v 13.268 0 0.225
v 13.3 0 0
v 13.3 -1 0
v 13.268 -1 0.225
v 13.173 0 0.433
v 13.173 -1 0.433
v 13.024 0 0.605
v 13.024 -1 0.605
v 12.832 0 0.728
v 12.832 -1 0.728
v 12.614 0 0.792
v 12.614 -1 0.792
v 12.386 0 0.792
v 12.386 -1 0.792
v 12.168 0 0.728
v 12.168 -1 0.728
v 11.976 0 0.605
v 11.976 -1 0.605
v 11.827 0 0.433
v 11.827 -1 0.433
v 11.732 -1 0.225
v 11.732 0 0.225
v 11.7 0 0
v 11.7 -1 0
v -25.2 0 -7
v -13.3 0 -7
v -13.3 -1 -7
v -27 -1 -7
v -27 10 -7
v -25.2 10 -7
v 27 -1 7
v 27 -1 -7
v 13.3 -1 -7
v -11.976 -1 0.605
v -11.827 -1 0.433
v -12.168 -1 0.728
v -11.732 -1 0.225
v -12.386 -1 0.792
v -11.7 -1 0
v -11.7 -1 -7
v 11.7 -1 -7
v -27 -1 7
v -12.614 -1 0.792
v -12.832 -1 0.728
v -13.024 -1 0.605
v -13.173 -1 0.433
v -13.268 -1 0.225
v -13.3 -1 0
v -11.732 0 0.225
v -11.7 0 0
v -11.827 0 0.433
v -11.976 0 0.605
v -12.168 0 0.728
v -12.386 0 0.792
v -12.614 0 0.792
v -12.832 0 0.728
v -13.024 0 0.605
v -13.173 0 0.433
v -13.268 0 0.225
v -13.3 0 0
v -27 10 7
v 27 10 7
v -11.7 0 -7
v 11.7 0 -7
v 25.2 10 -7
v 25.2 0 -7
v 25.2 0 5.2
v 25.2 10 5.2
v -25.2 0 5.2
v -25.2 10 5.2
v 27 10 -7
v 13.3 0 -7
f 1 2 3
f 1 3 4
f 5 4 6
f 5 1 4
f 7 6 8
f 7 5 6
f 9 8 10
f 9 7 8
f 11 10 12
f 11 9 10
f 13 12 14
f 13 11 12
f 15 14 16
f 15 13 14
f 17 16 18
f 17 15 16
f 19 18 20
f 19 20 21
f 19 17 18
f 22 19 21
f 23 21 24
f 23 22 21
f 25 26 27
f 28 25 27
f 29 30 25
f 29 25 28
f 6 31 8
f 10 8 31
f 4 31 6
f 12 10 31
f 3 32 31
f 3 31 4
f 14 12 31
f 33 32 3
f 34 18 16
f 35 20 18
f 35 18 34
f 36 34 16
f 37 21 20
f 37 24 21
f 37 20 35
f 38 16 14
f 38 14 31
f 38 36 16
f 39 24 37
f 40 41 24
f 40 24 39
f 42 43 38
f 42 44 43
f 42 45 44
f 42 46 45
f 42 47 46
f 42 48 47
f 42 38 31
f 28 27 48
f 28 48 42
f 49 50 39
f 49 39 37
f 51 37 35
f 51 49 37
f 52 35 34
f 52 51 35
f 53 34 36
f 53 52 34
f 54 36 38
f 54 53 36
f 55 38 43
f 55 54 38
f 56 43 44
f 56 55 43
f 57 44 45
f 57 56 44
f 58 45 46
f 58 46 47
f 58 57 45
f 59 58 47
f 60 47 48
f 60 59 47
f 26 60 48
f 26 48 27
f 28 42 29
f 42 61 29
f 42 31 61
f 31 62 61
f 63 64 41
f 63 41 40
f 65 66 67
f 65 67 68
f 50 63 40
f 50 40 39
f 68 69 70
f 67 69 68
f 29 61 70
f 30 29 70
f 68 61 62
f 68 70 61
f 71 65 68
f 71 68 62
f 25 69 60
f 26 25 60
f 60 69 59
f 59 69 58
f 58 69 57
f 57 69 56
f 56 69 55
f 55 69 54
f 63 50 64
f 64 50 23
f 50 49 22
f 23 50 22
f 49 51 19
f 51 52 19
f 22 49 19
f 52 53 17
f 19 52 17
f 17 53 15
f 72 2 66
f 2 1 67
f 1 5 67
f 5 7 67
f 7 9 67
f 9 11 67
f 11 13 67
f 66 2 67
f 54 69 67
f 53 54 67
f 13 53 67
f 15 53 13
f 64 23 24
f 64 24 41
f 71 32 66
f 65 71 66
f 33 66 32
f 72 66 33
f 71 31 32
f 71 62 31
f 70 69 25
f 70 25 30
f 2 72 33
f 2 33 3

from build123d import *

# Parameters (mm, degrees)
ESQUISSE1_W             = 54
ESQUISSE1_H             = 14
ESQUISSE1_W_2           = 50.4
ESQUISSE1_H_2           = 10.4
BOSS_EXTRU_1_DEPTH      = 10
ESQUISSE2_W             = 54
ESQUISSE2_H             = 14
BOSS_EXTRU_2_DEPTH      = 1
ENL_V_MAT_EXTRU_1_DEPTH = 1
ESQUISSE4_W             = 50.4
ESQUISSE4_H             = 10
ENL_V_MAT_EXTRU_2_DEPTH = 1.8


with BuildPart() as part:
    # Esquisse1 → Boss.-Extru.1 (new body)
    with BuildSketch(Plane(origin=(0, 0, 0), x_dir=(1, 0, 0), z_dir=(0, 1, 0))):
        Rectangle(ESQUISSE1_W, ESQUISSE1_H)
        Rectangle(ESQUISSE1_W_2, ESQUISSE1_H_2, mode=Mode.SUBTRACT)
    extrude(amount=BOSS_EXTRU_1_DEPTH)

    # Esquisse2 → Boss.-Extru.2 (add)
    with BuildSketch(Plane(origin=(0, 0, 0), x_dir=(-1, 0, 0), z_dir=(0, -1, 0))):
        Rectangle(ESQUISSE2_W, ESQUISSE2_H)
    extrude(amount=BOSS_EXTRU_2_DEPTH)

    # Esquisse3 → Enlèv. mat.-Extru.1 (cut)
    with BuildSketch(Plane(origin=(0, 0, 0), x_dir=(1, 0, 0), z_dir=(0, 1, 0))):
        with BuildLine():
            Line((-13.3, 0), (-13.3, 7))
            Line((-13.3, 7), (-11.7, 7))
            Line((-11.7, 7), (-11.7, 0))
            ThreePointArc((-11.7, 0), (-12.5, -0.8), (-13.3, 0))
        make_face()
        with BuildLine():
            Line((11.7, 0), (11.7, 7))
            Line((11.7, 7), (13.3, 7))
            Line((13.3, 7), (13.3, 0))
            ThreePointArc((13.3, 0), (12.5, -0.8), (11.7, 0))
        make_face()
    extrude(amount=-ENL_V_MAT_EXTRU_1_DEPTH, mode=Mode.SUBTRACT)

    # Esquisse4 → Enlèv. mat.-Extru.2 (cut)
    with BuildSketch(Plane.XY.offset(-5.2)):
        with Locations((0, 5)):
            Rectangle(ESQUISSE4_W, ESQUISSE4_H)
    extrude(amount=-ENL_V_MAT_EXTRU_2_DEPTH, mode=Mode.SUBTRACT)


solid = part.part
